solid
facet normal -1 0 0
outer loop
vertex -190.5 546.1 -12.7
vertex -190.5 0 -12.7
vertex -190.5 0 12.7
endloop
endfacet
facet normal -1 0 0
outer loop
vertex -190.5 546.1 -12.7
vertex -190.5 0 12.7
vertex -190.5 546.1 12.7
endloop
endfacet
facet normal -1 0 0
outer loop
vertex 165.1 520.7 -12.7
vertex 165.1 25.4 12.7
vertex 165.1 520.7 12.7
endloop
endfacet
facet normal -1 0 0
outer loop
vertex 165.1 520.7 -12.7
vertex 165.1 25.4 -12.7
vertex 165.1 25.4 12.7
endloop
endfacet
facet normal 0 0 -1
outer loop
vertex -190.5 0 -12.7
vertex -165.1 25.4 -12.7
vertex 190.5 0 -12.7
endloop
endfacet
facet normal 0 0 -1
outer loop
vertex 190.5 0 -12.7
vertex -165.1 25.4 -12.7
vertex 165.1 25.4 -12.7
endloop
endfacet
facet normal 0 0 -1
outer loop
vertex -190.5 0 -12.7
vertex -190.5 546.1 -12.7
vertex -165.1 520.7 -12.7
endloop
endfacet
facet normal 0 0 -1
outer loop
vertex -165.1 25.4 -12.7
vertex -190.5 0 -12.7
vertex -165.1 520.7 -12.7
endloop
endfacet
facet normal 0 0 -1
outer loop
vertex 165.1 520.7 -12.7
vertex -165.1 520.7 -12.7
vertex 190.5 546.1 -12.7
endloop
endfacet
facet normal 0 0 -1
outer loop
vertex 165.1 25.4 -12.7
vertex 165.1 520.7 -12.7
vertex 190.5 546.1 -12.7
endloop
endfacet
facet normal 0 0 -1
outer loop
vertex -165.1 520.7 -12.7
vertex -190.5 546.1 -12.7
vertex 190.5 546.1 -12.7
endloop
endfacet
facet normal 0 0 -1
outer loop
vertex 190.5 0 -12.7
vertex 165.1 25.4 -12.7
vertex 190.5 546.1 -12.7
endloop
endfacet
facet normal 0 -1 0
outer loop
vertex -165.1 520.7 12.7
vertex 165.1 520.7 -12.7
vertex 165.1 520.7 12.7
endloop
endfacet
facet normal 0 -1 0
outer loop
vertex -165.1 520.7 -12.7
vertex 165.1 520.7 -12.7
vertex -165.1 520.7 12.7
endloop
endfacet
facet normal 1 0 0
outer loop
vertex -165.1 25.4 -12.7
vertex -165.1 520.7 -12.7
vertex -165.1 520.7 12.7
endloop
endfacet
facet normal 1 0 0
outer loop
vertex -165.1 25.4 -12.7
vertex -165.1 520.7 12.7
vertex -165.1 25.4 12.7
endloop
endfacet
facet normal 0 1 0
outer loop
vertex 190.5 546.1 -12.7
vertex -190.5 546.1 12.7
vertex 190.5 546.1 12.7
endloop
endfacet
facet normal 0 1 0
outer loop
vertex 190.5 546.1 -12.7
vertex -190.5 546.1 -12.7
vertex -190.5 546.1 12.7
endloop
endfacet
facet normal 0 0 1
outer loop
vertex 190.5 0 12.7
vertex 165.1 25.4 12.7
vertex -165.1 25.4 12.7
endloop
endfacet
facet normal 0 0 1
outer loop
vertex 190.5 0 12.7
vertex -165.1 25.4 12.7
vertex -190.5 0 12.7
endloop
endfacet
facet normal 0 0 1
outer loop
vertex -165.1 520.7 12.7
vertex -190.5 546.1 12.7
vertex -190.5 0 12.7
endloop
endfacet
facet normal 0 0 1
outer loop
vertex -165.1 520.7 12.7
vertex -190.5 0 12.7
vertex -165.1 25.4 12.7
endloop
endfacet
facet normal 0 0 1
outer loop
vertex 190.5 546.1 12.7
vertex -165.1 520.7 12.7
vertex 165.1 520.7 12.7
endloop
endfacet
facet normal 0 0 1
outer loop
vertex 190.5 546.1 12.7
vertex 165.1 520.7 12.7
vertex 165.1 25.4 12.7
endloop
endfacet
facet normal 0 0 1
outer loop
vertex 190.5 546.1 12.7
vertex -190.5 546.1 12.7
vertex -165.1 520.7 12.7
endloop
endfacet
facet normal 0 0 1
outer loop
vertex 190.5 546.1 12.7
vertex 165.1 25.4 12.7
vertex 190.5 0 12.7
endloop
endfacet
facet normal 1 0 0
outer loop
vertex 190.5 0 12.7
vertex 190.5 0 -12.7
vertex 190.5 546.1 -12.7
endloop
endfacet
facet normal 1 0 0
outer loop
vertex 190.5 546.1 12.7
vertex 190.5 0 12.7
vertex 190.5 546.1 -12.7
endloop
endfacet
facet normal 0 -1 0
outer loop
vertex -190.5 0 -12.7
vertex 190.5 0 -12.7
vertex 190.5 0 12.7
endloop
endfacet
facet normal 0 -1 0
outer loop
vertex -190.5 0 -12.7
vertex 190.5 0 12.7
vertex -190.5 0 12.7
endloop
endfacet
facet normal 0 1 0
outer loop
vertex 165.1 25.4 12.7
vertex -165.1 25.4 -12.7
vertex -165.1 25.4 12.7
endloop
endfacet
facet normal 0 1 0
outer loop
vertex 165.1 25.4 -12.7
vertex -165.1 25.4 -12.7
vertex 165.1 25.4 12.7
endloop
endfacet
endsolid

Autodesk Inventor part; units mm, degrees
ref_plane "YZ Plane" through (0, 0, 0) normal (1, 0, 0) x (0, 1, 0)
ref_plane "XZ Plane" through (0, 0, 0) normal (0, 1, 0) x (-1, 0, 0)
ref_plane "XY Plane" through (0, 0, 0) normal (0, 0, 1) x (1, 0, 0)
sketch "Sketch1" plane through (0, 0, 0) normal (0, 0, 1) x (1, 0, 0)
  line L0 (0, 0) -> (190.5, 0)
  line L1 (190.5, 0) -> (190.5, 546.1)
  line L2 (190.5, 546.1) -> (0, 546.1)
  line L3 (0, 0) -> (0, 546.1) construction
  line L4 (0, 0) -> (-190.5, 0)
  line L5 (-190.5, 0) -> (-190.5, 546.1)
  line L6 (-190.5, 546.1) -> (0, 546.1)
  line L7 (-165.1, 25.4) -> (165.1, 25.4)
  line L8 (165.1, 25.4) -> (165.1, 520.7)
  line L9 (165.1, 520.7) -> (-165.1, 520.7)
  line L10 (-165.1, 520.7) -> (-165.1, 25.4)
  dimension "d1" = 546.1
  dimension "d2" = 381
  dimension "d3" = 25.4
  dimension "d4" = 25.4
  dimension "d5" = 25.4
  dimension "d6" = 25.4
extrude "Extrusion1" add sketch "Sketch1" along normal mid plane 25.4
properties part number "primate2ndStageForShortRobot"
